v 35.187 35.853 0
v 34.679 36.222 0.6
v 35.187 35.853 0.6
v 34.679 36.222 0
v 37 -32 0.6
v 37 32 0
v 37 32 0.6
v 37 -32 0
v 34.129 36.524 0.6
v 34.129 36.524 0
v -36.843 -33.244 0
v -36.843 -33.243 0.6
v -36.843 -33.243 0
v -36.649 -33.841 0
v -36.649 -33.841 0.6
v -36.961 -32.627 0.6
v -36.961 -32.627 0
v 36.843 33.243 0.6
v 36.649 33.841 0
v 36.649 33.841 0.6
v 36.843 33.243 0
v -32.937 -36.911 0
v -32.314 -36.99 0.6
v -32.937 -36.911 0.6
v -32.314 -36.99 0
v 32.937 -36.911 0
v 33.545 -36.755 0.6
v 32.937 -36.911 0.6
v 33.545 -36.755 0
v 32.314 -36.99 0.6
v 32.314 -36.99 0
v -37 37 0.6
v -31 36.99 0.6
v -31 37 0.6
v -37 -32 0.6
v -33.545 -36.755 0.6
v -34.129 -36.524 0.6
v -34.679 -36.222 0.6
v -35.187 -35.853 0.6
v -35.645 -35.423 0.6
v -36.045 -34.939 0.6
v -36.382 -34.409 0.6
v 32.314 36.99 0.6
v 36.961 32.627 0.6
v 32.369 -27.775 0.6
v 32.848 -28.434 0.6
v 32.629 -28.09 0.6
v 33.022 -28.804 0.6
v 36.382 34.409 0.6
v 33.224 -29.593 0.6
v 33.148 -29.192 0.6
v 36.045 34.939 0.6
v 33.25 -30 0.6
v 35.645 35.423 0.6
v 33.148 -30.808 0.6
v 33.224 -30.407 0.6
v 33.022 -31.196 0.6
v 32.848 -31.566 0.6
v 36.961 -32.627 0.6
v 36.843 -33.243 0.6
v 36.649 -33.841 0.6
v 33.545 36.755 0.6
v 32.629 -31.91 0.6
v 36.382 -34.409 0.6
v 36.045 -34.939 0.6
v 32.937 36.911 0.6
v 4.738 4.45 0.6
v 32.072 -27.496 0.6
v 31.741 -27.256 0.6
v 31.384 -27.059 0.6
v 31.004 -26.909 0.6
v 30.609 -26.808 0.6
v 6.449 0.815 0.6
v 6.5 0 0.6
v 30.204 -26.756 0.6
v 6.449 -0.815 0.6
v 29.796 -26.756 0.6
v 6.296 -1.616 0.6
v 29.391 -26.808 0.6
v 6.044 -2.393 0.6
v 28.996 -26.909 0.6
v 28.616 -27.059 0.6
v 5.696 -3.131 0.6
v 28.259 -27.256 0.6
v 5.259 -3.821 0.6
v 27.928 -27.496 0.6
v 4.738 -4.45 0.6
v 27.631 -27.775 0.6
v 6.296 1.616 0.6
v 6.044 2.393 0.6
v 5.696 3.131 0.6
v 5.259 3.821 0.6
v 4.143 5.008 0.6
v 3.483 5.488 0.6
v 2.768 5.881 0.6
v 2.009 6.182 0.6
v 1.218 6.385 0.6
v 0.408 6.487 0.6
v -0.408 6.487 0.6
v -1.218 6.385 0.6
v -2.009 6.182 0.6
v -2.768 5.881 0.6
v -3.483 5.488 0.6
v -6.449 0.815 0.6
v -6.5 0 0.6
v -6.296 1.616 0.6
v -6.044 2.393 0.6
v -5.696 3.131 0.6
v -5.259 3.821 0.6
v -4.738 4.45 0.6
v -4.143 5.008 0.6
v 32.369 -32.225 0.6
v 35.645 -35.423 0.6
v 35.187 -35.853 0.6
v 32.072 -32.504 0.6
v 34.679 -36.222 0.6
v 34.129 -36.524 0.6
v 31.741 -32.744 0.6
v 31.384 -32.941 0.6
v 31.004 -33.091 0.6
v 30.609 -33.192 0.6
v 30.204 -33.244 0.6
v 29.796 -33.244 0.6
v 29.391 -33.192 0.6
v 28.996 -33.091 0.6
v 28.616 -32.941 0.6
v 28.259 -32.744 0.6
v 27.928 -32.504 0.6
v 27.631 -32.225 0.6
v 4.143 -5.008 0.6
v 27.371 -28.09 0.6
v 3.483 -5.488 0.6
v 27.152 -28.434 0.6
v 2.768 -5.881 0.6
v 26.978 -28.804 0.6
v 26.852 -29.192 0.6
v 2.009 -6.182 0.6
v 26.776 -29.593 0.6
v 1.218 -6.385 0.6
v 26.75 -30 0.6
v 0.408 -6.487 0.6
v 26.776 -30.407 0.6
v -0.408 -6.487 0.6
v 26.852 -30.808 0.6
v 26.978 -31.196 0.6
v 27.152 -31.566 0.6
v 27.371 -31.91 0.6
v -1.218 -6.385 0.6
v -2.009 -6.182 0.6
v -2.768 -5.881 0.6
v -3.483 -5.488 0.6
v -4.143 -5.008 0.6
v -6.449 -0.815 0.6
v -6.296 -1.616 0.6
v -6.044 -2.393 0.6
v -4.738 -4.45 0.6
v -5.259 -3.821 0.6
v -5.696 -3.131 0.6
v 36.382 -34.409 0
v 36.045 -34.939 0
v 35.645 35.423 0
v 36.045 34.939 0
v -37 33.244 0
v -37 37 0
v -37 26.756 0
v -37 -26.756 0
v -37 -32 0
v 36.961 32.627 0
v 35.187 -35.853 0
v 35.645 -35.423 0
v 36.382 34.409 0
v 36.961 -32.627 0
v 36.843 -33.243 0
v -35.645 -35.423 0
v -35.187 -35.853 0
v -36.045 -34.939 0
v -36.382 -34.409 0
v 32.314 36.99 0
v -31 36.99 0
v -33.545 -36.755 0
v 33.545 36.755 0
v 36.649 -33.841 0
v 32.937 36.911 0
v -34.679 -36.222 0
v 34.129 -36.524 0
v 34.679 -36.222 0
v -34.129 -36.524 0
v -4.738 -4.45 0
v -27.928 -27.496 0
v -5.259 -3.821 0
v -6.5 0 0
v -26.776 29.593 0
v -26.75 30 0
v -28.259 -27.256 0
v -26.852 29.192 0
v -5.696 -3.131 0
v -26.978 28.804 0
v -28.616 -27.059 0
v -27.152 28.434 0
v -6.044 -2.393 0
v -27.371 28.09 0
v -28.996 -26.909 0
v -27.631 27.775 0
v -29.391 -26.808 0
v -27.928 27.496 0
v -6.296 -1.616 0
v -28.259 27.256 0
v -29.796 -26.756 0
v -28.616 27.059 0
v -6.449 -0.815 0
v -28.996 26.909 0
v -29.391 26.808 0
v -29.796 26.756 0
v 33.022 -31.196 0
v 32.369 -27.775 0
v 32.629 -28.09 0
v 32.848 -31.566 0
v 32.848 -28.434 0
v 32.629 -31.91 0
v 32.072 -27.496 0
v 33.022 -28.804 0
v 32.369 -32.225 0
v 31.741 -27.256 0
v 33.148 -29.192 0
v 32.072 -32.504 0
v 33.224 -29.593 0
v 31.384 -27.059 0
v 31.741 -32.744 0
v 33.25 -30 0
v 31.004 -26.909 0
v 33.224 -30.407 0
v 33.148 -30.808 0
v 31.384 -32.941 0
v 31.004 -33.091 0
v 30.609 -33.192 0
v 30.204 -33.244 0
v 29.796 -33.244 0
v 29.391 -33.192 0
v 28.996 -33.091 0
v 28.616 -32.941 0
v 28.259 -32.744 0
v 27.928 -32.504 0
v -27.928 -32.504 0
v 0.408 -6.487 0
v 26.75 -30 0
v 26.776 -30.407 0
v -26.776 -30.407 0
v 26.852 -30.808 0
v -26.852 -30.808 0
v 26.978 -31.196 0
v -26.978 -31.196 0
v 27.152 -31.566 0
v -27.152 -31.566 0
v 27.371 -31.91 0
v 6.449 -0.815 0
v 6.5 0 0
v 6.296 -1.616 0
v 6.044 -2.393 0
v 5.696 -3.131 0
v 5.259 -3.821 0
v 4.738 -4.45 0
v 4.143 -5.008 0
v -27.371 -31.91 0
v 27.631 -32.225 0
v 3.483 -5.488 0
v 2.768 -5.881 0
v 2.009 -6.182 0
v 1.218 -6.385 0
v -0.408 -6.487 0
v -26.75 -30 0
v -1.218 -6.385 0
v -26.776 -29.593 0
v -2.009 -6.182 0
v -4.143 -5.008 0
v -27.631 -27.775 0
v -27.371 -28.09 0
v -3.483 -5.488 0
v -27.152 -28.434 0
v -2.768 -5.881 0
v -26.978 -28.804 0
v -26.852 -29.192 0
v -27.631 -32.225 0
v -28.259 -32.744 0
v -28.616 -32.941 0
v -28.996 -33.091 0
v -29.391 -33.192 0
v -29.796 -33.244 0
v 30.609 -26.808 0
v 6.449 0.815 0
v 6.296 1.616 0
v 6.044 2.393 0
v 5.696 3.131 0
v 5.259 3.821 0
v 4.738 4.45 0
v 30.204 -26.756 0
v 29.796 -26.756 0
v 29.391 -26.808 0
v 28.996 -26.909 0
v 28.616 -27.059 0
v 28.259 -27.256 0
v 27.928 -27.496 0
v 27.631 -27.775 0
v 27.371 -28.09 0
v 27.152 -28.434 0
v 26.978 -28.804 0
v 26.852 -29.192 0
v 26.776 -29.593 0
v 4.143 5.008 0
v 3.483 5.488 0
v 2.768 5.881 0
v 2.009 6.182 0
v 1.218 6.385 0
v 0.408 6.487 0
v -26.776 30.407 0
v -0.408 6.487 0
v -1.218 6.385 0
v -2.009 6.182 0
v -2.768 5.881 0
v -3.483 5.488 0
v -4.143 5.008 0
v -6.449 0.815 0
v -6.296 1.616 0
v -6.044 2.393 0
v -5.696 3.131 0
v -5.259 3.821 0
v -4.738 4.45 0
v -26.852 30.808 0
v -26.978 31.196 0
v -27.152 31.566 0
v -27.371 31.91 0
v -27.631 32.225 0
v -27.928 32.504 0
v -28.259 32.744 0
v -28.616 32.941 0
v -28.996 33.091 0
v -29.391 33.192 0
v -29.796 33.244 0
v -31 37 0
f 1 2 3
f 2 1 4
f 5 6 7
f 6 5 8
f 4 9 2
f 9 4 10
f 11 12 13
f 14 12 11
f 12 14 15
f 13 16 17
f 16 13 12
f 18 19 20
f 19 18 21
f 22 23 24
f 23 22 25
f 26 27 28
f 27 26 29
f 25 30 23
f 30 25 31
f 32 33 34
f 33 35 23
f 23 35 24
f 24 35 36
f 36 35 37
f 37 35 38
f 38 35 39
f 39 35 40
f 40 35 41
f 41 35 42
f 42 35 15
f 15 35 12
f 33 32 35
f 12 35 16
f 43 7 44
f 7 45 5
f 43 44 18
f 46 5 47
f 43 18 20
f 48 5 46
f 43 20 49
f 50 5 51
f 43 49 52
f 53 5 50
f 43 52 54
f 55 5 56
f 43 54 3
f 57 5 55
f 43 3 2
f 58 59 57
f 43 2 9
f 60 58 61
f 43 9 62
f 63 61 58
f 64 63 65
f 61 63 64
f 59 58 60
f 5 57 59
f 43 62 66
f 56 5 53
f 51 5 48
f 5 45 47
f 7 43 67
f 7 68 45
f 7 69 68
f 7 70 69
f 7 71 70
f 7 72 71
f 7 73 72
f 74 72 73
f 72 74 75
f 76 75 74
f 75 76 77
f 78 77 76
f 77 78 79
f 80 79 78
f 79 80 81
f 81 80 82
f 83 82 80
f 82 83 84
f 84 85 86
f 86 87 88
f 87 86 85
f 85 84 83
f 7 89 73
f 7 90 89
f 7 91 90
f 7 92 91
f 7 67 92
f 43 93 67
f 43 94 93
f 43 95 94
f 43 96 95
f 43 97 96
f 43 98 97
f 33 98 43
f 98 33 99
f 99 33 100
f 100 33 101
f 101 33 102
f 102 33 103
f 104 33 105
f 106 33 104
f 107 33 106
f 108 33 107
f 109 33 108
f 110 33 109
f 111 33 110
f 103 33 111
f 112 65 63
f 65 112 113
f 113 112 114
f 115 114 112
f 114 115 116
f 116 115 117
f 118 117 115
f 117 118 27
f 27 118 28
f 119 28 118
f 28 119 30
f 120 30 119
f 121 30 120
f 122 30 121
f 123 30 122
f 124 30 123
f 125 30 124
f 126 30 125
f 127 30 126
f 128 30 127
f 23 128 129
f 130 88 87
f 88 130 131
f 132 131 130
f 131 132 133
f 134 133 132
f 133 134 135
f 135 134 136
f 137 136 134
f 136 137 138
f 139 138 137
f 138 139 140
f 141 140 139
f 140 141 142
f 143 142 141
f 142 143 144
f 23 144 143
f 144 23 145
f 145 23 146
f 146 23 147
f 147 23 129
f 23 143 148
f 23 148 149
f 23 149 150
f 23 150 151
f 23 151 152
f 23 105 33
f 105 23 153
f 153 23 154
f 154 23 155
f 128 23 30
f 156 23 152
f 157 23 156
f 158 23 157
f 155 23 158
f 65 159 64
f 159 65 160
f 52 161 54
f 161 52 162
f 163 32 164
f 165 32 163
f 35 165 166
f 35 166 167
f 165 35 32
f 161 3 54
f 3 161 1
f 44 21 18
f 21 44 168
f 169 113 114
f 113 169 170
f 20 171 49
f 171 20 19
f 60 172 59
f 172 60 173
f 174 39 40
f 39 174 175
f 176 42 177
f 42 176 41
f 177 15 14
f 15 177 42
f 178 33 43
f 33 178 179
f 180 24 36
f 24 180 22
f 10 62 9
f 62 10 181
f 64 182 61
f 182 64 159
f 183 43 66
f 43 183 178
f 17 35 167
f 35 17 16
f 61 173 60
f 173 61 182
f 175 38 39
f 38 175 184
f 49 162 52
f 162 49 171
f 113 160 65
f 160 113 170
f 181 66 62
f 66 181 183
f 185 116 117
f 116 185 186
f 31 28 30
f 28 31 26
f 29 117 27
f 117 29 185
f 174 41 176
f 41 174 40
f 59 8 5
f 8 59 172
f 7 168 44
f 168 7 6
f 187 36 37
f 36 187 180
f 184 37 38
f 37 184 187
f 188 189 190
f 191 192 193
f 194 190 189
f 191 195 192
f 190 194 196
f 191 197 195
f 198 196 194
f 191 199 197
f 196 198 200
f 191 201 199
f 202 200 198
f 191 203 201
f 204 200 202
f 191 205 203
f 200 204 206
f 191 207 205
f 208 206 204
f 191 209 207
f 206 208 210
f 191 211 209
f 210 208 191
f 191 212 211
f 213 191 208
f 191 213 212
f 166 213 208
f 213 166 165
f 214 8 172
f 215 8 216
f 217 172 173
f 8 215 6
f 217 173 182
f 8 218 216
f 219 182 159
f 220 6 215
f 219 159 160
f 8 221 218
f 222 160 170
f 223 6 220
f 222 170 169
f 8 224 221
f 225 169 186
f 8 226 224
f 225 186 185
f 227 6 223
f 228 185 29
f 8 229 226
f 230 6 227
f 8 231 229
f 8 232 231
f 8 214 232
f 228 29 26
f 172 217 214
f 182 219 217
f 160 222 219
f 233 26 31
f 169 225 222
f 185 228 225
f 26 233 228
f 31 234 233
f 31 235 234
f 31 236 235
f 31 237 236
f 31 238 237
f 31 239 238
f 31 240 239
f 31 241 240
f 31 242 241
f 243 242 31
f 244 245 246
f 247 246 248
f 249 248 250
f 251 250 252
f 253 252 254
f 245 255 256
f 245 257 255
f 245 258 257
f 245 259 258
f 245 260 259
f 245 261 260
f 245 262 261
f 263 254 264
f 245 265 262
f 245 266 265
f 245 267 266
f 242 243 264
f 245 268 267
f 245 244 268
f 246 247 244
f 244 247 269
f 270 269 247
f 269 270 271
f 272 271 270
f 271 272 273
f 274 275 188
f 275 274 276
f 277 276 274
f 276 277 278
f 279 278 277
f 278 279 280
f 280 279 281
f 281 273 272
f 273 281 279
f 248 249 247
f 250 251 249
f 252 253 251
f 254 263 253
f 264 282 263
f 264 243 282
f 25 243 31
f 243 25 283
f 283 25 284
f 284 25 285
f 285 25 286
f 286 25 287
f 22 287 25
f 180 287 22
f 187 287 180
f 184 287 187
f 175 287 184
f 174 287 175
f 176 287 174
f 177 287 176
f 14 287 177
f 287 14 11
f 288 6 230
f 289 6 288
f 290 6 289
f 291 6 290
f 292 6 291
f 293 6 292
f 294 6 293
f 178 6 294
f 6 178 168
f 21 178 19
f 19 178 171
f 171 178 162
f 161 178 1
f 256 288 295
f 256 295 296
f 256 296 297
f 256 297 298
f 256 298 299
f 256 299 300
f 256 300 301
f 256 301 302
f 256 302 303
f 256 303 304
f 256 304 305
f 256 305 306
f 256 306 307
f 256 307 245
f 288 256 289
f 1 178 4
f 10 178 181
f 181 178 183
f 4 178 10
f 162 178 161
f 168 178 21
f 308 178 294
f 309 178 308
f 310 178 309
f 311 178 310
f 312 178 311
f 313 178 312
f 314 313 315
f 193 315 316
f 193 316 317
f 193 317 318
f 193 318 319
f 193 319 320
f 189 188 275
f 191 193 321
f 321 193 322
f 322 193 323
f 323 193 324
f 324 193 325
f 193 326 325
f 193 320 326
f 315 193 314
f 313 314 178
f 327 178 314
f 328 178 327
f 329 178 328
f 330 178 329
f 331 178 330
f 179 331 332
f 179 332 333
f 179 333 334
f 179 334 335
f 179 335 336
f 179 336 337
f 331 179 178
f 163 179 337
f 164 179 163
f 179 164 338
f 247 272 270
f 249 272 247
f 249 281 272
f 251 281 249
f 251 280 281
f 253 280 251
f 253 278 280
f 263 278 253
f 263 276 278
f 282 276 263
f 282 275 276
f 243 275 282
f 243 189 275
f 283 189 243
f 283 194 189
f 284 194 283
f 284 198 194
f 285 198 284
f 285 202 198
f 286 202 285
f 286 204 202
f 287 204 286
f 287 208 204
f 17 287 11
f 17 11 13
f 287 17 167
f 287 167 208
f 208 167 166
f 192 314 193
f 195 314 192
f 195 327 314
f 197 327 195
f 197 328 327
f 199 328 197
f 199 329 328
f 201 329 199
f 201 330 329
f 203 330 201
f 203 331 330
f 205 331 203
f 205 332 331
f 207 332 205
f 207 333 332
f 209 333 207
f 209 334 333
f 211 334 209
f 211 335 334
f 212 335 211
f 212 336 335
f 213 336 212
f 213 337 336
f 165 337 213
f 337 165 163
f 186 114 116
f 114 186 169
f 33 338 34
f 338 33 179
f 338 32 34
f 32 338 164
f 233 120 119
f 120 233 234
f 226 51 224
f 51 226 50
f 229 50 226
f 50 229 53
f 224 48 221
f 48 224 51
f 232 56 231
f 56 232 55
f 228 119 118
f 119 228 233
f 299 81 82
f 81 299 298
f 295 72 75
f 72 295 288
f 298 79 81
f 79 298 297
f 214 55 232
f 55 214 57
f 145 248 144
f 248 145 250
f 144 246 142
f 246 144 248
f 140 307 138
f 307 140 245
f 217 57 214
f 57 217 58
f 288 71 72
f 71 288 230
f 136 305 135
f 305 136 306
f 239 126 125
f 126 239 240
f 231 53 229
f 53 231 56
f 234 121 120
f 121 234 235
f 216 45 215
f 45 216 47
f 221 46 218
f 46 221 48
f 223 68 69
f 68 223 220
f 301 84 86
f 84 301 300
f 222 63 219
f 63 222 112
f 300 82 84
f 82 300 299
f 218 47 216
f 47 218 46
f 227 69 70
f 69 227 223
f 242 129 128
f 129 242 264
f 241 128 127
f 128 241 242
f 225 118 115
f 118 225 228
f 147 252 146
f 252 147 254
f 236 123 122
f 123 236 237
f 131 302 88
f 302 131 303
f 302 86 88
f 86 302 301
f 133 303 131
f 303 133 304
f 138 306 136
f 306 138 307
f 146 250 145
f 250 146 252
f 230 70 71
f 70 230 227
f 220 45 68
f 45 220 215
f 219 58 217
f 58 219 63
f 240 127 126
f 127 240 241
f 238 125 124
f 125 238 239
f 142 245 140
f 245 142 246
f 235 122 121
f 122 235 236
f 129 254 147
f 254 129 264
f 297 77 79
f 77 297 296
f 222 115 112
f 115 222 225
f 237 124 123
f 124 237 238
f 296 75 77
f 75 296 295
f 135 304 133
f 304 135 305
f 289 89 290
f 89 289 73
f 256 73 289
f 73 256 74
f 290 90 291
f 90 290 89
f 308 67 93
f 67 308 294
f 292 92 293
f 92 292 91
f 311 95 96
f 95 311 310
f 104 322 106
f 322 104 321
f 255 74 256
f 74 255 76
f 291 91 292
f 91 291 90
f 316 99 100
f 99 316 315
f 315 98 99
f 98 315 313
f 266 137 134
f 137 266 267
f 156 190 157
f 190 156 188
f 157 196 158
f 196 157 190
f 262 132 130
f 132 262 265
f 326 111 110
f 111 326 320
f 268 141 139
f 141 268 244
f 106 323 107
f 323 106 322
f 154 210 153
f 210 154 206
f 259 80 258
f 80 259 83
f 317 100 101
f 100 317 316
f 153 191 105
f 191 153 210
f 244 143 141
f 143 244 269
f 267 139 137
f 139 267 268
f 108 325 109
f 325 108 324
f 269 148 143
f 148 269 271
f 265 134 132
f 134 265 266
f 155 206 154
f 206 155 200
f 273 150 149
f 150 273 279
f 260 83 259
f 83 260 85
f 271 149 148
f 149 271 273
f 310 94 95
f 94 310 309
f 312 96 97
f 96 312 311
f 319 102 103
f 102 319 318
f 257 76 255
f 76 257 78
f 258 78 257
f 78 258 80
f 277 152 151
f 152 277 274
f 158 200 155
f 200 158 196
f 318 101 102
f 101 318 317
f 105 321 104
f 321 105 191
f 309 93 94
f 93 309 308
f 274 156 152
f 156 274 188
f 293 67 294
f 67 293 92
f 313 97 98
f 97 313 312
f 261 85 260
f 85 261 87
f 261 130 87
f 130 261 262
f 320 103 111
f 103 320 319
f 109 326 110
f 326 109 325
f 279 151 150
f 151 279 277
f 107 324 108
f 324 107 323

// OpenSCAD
$fn = 50;


difference() {
	union() {
		hull() {
			translate(v = [-32.0000000000, 32.0000000000, 0]) {
				cylinder(h = 0.6000000000, r = 5);
			}
			translate(v = [32.0000000000, 32.0000000000, 0]) {
				cylinder(h = 0.6000000000, r = 5);
			}
			translate(v = [-32.0000000000, -32.0000000000, 0]) {
				cylinder(h = 0.6000000000, r = 5);
			}
			translate(v = [32.0000000000, -32.0000000000, 0]) {
				cylinder(h = 0.6000000000, r = 5);
			}
		}
		translate(v = [-37.0000000000, 31.0000000000, 0]) {
			cube(size = [6, 6, 0.6000000000]);
		}
	}
	union() {
		translate(v = [-37.5000000000, -30.0000000000, -250.0000000000]) {
			rotate(a = [0, 0, 0]) {
				difference() {
					union() {
						hull() {
							translate(v = [7.5000000000, 0, 0]) {
								cylinder(h = 250, r = 3.2500000000, r1 = 3.2500000000, r2 = 3.2500000000);
							}
							translate(v = [-7.5000000000, 0, 0]) {
								cylinder(h = 250, r = 3.2500000000, r1 = 3.2500000000, r2 = 3.2500000000);
							}
						}
					}
					union();
				}
			}
		}
		translate(v = [-37.5000000000, 30.0000000000, -250.0000000000]) {
			rotate(a = [0, 0, 0]) {
				difference() {
					union() {
						hull() {
							translate(v = [7.5000000000, 0, 0]) {
								cylinder(h = 250, r = 3.2500000000, r1 = 3.2500000000, r2 = 3.2500000000);
							}
							translate(v = [-7.5000000000, 0, 0]) {
								cylinder(h = 250, r = 3.2500000000, r1 = 3.2500000000, r2 = 3.2500000000);
							}
						}
					}
					union();
				}
			}
		}
		translate(v = [30.0000000000, -30.0000000000, -50.0000000000]) {
			cylinder(h = 100, r = 3.2500000000);
		}
		cylinder(h = 0.6000000000, r = 6.5000000000);
	}
}
